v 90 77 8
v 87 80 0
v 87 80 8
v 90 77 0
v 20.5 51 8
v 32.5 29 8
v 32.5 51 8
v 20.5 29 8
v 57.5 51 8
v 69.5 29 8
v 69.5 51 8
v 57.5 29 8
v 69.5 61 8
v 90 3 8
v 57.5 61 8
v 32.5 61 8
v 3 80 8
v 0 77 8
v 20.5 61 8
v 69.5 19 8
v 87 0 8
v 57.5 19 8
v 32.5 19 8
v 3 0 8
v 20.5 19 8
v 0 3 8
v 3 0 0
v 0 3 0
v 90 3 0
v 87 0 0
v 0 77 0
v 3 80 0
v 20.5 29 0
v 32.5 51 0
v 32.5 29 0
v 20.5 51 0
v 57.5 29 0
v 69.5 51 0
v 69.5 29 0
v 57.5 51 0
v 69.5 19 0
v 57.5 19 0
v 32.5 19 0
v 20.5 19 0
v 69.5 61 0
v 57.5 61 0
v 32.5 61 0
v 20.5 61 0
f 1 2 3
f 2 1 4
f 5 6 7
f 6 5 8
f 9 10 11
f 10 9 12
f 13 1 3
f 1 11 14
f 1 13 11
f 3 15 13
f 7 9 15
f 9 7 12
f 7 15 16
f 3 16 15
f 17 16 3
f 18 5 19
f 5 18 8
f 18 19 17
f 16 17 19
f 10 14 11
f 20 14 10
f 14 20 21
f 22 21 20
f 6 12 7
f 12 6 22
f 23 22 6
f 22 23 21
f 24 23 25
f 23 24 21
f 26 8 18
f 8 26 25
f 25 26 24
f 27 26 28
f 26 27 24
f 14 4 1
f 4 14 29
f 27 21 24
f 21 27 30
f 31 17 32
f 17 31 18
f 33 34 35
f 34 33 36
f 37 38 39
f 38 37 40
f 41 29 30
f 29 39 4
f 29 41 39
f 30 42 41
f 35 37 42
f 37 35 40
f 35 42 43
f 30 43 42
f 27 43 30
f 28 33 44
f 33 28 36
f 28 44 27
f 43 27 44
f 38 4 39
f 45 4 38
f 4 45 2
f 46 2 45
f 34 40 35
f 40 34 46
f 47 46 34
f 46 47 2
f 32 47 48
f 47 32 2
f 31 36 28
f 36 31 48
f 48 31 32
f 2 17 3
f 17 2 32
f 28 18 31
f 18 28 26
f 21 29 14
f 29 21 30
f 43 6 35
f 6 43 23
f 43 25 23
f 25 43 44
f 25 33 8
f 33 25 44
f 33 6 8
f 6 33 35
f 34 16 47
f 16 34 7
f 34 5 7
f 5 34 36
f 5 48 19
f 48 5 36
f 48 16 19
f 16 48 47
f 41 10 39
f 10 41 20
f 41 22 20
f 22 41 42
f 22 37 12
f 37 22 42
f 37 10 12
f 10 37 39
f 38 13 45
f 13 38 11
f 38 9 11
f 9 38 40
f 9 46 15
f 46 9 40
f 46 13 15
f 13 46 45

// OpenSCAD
$fn = 32;

// ----------------------------------------------------------------------
// Windowed plate: 4 voids, 90 x 80 x 8 mm
// ----------------------------------------------------------------------

// --- parameters (mm) ---
plate_l = 90;             // plate length, X
plate_w = 80;             // plate width, Y
plate_t = 8;              // plate thickness, Z
edge_margin = 8;          // wall from the plate edge to any window
win_l = 12;               // pocket length
win_w = 10;               // pocket width
pitch_x = 37;             // grid pitch along X
pitch_y = 32;             // grid pitch along Y
depth_1 = 8;              // depth of void 1 (full thickness = through)
depth_2 = 8;              // depth of void 2 (full thickness = through)
depth_3 = 8;              // depth of void 3 (full thickness = through)
depth_4 = 8;              // depth of void 4 (full thickness = through)
corner_c = 3;             // corner chamfer of the plate

profile = [[3, 0], [87, 0], [90, 3], [90, 77], [87, 80], [3, 80], [0, 77], [0, 3]];  // primary outline, 8 points, counter clockwise
void_1 = [[20.5, 19], [32.5, 19], [32.5, 29], [20.5, 29]];  // pocket at grid node 0,0, 4 points
void_2 = [[20.5, 51], [32.5, 51], [32.5, 61], [20.5, 61]];  // pocket at grid node 0,1, 4 points
void_3 = [[57.5, 19], [69.5, 19], [69.5, 29], [57.5, 29]];  // pocket at grid node 1,0, 4 points
void_4 = [[57.5, 51], [69.5, 51], [69.5, 61], [57.5, 61]];  // pocket at grid node 1,1, 4 points

// --- the one profile operation ---
difference() {
  linear_extrude(height = plate_t) polygon(points = profile);
  translate([0, 0, -1])
    linear_extrude(height = plate_t + 2) polygon(points = void_1);
  translate([0, 0, -1])
    linear_extrude(height = plate_t + 2) polygon(points = void_2);
  translate([0, 0, -1])
    linear_extrude(height = plate_t + 2) polygon(points = void_3);
  translate([0, 0, -1])
    linear_extrude(height = plate_t + 2) polygon(points = void_4);
}
